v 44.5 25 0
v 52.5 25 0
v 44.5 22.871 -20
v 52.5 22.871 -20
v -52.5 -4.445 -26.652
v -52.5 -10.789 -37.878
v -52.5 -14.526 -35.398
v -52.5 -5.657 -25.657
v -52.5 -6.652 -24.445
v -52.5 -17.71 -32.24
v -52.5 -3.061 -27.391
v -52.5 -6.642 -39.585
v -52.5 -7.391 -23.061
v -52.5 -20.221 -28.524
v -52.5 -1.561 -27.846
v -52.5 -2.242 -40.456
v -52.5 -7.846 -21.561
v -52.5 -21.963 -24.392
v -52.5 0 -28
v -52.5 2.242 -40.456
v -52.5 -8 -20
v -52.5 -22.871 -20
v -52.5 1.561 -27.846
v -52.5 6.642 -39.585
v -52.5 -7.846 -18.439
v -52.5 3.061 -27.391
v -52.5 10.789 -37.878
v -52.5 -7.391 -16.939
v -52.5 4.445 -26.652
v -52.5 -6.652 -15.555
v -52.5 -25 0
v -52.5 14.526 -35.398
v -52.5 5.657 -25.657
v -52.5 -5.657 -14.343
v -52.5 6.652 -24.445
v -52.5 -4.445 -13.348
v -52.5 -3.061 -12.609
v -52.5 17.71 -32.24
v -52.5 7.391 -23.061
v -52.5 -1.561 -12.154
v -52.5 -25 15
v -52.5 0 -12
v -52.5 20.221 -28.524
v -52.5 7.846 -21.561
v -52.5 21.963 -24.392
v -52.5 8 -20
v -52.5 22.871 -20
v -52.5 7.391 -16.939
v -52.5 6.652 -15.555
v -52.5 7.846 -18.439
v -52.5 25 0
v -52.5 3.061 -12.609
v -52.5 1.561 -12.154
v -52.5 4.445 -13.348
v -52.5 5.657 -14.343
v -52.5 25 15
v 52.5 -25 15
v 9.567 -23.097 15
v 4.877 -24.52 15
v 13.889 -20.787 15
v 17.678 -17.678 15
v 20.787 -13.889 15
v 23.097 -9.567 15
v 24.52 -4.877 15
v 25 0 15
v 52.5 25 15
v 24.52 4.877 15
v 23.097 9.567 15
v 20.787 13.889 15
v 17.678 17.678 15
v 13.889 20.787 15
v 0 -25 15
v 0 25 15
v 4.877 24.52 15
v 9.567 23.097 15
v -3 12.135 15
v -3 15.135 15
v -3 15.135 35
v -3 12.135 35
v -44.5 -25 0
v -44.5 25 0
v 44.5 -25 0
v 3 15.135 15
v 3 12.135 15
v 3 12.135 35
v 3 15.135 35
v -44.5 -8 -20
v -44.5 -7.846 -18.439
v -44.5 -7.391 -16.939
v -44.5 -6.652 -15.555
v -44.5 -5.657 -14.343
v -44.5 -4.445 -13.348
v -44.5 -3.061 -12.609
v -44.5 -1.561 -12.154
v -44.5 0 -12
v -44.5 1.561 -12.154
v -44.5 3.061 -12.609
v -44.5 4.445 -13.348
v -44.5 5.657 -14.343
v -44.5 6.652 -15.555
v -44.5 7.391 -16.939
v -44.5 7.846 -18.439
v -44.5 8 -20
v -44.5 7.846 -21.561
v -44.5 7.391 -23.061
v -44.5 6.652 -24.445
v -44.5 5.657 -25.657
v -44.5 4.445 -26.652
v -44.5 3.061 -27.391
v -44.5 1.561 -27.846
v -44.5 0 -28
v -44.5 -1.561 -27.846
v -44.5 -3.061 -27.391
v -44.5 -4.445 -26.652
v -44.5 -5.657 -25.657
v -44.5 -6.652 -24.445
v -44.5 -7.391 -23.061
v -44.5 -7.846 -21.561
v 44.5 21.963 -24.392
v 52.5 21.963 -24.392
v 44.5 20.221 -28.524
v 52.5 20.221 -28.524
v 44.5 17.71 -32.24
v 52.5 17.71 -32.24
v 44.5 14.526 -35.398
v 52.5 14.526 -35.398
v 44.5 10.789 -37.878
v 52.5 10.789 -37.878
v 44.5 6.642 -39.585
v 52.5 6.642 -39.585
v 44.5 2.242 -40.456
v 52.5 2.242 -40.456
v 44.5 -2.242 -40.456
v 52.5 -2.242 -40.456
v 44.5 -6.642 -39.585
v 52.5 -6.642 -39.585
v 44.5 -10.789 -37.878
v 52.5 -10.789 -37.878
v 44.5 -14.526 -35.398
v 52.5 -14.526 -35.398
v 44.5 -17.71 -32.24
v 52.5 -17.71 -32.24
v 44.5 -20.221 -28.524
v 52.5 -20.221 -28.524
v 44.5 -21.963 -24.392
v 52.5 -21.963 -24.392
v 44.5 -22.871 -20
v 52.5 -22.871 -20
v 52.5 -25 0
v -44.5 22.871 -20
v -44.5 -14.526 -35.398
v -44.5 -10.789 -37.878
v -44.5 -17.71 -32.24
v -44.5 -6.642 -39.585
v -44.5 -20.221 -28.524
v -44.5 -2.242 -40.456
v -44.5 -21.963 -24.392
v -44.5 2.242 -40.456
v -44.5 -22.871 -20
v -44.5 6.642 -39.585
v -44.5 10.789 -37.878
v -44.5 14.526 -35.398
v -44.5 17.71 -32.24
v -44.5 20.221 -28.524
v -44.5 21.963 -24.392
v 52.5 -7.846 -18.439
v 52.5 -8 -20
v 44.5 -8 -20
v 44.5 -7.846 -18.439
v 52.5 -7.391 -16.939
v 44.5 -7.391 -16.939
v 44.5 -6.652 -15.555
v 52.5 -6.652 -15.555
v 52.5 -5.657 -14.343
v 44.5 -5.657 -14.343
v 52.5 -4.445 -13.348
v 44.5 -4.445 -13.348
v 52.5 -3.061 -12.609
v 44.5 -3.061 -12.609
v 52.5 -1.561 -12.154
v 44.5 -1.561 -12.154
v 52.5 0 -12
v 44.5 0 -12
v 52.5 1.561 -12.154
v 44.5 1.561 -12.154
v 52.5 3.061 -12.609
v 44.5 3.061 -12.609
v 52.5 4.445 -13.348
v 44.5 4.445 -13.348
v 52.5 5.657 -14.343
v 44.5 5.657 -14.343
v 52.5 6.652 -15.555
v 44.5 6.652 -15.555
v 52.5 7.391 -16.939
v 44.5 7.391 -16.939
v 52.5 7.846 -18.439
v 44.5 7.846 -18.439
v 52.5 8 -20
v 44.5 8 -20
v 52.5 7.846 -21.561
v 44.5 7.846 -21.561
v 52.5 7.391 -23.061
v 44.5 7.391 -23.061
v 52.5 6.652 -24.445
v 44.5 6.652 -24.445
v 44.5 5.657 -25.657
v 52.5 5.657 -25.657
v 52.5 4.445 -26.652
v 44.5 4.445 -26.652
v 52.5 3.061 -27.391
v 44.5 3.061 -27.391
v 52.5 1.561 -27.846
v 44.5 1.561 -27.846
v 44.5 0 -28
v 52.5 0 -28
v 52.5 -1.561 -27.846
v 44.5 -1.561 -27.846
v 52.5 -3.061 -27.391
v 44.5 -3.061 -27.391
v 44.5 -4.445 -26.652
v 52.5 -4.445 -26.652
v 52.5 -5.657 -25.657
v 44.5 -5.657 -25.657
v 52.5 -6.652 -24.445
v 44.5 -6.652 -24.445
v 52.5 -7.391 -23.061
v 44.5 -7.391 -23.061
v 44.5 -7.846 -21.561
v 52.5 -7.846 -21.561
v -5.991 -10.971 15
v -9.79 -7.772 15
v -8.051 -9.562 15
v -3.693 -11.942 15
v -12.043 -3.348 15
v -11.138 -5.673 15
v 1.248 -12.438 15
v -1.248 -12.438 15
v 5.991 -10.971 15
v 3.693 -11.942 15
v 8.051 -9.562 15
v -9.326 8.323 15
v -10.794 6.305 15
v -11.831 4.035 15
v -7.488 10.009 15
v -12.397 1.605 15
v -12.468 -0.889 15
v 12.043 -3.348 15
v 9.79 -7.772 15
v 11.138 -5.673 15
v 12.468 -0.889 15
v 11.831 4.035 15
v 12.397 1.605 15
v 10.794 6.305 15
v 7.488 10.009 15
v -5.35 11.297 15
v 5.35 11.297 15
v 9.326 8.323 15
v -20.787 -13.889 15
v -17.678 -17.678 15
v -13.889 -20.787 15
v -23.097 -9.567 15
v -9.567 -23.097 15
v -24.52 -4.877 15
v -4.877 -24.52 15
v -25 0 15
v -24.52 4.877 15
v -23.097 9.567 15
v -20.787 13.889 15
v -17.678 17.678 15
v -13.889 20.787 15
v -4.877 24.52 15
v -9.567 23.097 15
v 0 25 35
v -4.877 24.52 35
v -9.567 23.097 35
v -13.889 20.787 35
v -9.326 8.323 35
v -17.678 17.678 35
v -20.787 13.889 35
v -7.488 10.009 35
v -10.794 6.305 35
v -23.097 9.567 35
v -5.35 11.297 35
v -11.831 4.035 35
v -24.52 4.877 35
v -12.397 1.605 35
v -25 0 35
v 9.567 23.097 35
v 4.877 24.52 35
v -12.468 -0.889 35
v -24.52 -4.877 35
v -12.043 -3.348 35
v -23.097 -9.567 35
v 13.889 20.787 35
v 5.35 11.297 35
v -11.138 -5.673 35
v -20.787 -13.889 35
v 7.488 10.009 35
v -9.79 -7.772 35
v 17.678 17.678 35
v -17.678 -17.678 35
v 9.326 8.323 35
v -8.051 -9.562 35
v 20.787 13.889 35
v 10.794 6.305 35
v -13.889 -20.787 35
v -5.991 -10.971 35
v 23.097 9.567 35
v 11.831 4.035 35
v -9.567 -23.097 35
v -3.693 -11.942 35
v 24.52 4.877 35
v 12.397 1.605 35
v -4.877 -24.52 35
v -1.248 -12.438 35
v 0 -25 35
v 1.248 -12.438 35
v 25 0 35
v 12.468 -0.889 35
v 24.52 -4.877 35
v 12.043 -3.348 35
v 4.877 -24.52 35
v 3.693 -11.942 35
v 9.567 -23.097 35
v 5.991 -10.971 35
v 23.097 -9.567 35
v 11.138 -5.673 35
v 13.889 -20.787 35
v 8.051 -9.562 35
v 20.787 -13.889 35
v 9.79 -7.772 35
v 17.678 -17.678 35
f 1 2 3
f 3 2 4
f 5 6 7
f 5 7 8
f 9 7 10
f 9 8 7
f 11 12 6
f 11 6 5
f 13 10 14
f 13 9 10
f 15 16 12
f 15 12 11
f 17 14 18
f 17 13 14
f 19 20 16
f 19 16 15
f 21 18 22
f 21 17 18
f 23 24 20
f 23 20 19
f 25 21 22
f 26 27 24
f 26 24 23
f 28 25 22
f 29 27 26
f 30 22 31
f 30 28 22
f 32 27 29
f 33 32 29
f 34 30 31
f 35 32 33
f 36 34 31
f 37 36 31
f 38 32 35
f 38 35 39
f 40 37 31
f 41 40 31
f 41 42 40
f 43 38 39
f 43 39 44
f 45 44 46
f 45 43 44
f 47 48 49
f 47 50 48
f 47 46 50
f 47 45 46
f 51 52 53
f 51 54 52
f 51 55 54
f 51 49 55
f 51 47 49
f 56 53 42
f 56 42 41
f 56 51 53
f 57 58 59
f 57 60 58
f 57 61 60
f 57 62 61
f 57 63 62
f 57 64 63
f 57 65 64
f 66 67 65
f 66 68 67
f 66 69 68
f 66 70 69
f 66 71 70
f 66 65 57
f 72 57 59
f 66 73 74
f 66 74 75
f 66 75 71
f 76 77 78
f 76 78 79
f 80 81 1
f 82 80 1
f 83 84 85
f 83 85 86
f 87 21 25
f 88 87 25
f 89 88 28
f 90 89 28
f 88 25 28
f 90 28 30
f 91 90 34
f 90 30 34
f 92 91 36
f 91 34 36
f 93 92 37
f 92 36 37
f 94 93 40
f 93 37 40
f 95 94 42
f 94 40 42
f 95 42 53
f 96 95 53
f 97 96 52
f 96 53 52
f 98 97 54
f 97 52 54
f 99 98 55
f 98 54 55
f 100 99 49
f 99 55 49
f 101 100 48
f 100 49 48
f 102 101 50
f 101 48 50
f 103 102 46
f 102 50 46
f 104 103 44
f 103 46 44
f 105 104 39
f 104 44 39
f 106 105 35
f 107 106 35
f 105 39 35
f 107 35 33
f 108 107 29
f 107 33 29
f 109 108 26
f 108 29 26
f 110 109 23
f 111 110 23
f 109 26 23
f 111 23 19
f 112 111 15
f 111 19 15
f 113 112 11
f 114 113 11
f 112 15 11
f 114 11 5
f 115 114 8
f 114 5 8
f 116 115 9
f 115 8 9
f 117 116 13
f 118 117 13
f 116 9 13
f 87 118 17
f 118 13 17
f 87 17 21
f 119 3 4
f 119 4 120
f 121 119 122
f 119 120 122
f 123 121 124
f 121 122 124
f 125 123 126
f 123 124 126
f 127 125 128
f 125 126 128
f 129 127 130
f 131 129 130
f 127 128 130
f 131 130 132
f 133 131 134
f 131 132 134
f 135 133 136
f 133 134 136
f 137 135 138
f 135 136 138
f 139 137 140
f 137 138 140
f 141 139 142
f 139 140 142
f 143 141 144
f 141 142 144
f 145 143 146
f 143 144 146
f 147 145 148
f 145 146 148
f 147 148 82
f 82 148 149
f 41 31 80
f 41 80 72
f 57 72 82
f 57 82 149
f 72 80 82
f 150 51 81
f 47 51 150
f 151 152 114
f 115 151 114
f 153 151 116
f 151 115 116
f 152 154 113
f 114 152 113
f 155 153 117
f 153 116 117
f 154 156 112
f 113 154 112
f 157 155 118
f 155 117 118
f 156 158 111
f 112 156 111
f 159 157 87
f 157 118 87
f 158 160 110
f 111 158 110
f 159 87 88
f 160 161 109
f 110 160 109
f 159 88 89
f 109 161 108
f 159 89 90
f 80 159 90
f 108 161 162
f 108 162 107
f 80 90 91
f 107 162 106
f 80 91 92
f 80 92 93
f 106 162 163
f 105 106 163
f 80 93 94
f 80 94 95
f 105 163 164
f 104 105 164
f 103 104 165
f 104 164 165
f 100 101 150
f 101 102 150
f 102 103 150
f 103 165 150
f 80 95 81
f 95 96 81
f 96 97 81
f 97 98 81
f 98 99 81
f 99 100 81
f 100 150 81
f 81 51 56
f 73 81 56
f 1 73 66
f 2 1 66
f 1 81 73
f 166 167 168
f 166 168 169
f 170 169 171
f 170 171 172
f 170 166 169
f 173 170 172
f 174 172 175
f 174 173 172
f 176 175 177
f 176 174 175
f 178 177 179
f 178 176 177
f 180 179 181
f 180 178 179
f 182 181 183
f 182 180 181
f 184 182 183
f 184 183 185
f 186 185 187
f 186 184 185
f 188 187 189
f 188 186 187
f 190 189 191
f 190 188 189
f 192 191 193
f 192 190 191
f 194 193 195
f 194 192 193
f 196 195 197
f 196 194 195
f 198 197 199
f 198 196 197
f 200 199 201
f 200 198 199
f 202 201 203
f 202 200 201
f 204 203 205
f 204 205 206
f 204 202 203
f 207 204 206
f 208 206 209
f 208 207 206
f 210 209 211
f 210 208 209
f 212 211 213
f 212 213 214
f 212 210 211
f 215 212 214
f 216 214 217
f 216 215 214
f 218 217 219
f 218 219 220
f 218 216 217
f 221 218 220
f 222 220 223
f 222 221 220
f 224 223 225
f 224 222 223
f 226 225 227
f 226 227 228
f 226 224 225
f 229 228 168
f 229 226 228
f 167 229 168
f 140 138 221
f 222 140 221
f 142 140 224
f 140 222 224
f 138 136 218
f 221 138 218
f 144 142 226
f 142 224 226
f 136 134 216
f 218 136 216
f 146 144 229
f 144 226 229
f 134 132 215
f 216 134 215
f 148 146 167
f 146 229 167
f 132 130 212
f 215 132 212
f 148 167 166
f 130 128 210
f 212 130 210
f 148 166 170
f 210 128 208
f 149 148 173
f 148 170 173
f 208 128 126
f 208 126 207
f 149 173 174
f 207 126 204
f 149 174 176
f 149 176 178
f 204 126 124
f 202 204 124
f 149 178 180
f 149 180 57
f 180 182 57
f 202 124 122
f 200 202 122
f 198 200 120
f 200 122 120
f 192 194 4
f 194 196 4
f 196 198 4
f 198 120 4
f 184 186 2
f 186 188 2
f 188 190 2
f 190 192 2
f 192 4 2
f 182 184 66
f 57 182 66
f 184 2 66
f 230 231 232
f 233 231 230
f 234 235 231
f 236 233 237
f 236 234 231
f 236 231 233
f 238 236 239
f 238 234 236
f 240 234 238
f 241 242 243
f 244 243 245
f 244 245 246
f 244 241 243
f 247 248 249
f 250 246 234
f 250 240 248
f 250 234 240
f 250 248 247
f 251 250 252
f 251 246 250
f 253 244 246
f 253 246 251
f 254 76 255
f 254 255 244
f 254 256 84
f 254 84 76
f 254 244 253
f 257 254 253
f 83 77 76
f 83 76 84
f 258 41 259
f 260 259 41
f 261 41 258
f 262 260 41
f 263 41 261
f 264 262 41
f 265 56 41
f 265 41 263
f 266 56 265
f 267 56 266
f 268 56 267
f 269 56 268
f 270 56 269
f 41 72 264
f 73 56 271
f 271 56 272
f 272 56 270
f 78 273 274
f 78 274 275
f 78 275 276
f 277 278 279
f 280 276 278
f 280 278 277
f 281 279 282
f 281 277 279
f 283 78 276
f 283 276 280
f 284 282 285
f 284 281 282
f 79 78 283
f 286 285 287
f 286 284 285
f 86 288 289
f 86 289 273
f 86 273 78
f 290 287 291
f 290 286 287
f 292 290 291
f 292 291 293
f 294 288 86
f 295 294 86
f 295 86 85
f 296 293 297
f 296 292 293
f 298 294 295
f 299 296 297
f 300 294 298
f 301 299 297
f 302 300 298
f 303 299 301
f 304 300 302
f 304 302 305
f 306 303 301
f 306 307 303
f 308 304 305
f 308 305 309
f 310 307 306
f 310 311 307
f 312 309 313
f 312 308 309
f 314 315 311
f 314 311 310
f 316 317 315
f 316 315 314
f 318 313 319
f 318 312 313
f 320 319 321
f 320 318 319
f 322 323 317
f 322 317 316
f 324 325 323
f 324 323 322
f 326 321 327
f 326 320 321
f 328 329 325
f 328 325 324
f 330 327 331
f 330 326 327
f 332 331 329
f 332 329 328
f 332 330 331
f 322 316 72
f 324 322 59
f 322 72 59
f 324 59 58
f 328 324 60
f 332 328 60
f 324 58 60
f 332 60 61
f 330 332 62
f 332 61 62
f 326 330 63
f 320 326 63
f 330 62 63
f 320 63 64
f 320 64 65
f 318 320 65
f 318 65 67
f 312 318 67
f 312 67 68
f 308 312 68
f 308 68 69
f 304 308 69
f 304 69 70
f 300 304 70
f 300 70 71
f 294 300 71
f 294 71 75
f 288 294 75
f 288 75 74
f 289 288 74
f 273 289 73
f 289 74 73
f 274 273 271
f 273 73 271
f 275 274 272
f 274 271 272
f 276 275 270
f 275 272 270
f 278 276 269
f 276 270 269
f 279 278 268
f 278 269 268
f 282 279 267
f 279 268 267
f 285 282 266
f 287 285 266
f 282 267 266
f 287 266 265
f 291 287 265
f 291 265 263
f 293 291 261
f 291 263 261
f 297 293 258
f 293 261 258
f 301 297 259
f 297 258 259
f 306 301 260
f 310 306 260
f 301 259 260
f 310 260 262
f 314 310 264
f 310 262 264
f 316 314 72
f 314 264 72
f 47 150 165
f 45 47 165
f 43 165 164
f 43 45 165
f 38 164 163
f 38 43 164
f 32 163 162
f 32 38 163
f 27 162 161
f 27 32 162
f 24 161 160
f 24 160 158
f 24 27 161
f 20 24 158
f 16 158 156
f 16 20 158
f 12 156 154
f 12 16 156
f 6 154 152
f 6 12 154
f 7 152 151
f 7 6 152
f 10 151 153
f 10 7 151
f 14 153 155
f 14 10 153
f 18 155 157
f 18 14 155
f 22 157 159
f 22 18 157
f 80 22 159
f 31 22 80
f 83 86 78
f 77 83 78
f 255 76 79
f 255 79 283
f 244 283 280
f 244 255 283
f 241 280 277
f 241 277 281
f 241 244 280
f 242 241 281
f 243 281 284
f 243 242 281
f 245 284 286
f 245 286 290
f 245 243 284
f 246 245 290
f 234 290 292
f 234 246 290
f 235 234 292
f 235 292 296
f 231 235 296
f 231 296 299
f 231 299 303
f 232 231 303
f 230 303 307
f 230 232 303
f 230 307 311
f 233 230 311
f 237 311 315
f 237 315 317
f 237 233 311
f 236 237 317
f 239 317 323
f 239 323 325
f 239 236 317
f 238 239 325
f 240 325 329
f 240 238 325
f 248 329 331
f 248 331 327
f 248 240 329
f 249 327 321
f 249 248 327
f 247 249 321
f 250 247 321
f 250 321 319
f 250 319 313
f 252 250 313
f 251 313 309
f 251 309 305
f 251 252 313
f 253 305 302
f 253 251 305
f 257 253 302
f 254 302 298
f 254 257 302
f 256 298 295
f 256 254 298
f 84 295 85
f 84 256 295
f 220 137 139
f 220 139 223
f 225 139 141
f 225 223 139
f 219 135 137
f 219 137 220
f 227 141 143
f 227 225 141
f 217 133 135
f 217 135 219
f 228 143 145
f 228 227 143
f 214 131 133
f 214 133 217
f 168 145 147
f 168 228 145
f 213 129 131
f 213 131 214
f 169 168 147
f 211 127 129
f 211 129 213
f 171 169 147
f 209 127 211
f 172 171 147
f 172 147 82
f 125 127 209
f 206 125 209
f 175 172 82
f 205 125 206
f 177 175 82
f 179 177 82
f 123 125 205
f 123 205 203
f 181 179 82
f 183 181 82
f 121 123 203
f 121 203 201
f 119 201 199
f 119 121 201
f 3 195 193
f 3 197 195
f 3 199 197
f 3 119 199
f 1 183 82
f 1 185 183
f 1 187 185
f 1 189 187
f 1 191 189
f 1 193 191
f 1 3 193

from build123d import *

# Parameters (mm, degrees)
SKETCH1_W           = 105
SKETCH1_H           = 50
BOSS_EXTRUDE1_DEPTH = 15
SKETCH4_R           = 8
BOSS_EXTRUDE2_DEPTH = 8
SKETCH5_R           = 25
BOSS_EXTRUDE3_DEPTH = 20


with BuildPart() as part:
    # Sketch1 → Boss-Extrude1 (new body)
    with BuildSketch(Plane.XY):
        Rectangle(SKETCH1_W, SKETCH1_H)
    extrude(amount=BOSS_EXTRUDE1_DEPTH)

    # Sketch4 → Boss-Extrude2 (add)
    with BuildSketch(Plane.ZY.offset(52.5)):
        with BuildLine():
            Line((0, -25), (0, 25))
            Line((0, 25), (-20, 22.870754113))
            ThreePointArc((-20, 22.870754113), (-40.565127043, 0), (-20, -22.870754113))
            Line((-20, -22.870754113), (0, -25))
        make_face()
        with Locations(Location((-20, 0, 0), (0, 0, 270))):
            Circle(SKETCH4_R, mode=Mode.SUBTRACT)
    boss_extrude2 = extrude(amount=-BOSS_EXTRUDE2_DEPTH)

    # Mirror1: Boss-Extrude2 across plane
    add(boss_extrude2.mirror(Plane(origin=(0, 0, 0), x_dir=(0, 0, 1), z_dir=(1, 0, 0))))

    # Sketch5 → Boss-Extrude3 (add)
    with BuildSketch(Plane.XY.offset(15)):
        with Locations(Location((0, 0, 0), (0, 0, 270))):
            Circle(SKETCH5_R)
        with BuildLine():
            Line((3, 12.1346611), (3, 15.1346611))
            Line((3, 15.1346611), (-3, 15.1346611))
            Line((-3, 15.1346611), (-3, 12.1346611))
            ThreePointArc((-3, 12.1346611), (0, -12.5), (3, 12.1346611))
        make_face(mode=Mode.SUBTRACT)
    extrude(amount=BOSS_EXTRUDE3_DEPTH)


solid = part.part
